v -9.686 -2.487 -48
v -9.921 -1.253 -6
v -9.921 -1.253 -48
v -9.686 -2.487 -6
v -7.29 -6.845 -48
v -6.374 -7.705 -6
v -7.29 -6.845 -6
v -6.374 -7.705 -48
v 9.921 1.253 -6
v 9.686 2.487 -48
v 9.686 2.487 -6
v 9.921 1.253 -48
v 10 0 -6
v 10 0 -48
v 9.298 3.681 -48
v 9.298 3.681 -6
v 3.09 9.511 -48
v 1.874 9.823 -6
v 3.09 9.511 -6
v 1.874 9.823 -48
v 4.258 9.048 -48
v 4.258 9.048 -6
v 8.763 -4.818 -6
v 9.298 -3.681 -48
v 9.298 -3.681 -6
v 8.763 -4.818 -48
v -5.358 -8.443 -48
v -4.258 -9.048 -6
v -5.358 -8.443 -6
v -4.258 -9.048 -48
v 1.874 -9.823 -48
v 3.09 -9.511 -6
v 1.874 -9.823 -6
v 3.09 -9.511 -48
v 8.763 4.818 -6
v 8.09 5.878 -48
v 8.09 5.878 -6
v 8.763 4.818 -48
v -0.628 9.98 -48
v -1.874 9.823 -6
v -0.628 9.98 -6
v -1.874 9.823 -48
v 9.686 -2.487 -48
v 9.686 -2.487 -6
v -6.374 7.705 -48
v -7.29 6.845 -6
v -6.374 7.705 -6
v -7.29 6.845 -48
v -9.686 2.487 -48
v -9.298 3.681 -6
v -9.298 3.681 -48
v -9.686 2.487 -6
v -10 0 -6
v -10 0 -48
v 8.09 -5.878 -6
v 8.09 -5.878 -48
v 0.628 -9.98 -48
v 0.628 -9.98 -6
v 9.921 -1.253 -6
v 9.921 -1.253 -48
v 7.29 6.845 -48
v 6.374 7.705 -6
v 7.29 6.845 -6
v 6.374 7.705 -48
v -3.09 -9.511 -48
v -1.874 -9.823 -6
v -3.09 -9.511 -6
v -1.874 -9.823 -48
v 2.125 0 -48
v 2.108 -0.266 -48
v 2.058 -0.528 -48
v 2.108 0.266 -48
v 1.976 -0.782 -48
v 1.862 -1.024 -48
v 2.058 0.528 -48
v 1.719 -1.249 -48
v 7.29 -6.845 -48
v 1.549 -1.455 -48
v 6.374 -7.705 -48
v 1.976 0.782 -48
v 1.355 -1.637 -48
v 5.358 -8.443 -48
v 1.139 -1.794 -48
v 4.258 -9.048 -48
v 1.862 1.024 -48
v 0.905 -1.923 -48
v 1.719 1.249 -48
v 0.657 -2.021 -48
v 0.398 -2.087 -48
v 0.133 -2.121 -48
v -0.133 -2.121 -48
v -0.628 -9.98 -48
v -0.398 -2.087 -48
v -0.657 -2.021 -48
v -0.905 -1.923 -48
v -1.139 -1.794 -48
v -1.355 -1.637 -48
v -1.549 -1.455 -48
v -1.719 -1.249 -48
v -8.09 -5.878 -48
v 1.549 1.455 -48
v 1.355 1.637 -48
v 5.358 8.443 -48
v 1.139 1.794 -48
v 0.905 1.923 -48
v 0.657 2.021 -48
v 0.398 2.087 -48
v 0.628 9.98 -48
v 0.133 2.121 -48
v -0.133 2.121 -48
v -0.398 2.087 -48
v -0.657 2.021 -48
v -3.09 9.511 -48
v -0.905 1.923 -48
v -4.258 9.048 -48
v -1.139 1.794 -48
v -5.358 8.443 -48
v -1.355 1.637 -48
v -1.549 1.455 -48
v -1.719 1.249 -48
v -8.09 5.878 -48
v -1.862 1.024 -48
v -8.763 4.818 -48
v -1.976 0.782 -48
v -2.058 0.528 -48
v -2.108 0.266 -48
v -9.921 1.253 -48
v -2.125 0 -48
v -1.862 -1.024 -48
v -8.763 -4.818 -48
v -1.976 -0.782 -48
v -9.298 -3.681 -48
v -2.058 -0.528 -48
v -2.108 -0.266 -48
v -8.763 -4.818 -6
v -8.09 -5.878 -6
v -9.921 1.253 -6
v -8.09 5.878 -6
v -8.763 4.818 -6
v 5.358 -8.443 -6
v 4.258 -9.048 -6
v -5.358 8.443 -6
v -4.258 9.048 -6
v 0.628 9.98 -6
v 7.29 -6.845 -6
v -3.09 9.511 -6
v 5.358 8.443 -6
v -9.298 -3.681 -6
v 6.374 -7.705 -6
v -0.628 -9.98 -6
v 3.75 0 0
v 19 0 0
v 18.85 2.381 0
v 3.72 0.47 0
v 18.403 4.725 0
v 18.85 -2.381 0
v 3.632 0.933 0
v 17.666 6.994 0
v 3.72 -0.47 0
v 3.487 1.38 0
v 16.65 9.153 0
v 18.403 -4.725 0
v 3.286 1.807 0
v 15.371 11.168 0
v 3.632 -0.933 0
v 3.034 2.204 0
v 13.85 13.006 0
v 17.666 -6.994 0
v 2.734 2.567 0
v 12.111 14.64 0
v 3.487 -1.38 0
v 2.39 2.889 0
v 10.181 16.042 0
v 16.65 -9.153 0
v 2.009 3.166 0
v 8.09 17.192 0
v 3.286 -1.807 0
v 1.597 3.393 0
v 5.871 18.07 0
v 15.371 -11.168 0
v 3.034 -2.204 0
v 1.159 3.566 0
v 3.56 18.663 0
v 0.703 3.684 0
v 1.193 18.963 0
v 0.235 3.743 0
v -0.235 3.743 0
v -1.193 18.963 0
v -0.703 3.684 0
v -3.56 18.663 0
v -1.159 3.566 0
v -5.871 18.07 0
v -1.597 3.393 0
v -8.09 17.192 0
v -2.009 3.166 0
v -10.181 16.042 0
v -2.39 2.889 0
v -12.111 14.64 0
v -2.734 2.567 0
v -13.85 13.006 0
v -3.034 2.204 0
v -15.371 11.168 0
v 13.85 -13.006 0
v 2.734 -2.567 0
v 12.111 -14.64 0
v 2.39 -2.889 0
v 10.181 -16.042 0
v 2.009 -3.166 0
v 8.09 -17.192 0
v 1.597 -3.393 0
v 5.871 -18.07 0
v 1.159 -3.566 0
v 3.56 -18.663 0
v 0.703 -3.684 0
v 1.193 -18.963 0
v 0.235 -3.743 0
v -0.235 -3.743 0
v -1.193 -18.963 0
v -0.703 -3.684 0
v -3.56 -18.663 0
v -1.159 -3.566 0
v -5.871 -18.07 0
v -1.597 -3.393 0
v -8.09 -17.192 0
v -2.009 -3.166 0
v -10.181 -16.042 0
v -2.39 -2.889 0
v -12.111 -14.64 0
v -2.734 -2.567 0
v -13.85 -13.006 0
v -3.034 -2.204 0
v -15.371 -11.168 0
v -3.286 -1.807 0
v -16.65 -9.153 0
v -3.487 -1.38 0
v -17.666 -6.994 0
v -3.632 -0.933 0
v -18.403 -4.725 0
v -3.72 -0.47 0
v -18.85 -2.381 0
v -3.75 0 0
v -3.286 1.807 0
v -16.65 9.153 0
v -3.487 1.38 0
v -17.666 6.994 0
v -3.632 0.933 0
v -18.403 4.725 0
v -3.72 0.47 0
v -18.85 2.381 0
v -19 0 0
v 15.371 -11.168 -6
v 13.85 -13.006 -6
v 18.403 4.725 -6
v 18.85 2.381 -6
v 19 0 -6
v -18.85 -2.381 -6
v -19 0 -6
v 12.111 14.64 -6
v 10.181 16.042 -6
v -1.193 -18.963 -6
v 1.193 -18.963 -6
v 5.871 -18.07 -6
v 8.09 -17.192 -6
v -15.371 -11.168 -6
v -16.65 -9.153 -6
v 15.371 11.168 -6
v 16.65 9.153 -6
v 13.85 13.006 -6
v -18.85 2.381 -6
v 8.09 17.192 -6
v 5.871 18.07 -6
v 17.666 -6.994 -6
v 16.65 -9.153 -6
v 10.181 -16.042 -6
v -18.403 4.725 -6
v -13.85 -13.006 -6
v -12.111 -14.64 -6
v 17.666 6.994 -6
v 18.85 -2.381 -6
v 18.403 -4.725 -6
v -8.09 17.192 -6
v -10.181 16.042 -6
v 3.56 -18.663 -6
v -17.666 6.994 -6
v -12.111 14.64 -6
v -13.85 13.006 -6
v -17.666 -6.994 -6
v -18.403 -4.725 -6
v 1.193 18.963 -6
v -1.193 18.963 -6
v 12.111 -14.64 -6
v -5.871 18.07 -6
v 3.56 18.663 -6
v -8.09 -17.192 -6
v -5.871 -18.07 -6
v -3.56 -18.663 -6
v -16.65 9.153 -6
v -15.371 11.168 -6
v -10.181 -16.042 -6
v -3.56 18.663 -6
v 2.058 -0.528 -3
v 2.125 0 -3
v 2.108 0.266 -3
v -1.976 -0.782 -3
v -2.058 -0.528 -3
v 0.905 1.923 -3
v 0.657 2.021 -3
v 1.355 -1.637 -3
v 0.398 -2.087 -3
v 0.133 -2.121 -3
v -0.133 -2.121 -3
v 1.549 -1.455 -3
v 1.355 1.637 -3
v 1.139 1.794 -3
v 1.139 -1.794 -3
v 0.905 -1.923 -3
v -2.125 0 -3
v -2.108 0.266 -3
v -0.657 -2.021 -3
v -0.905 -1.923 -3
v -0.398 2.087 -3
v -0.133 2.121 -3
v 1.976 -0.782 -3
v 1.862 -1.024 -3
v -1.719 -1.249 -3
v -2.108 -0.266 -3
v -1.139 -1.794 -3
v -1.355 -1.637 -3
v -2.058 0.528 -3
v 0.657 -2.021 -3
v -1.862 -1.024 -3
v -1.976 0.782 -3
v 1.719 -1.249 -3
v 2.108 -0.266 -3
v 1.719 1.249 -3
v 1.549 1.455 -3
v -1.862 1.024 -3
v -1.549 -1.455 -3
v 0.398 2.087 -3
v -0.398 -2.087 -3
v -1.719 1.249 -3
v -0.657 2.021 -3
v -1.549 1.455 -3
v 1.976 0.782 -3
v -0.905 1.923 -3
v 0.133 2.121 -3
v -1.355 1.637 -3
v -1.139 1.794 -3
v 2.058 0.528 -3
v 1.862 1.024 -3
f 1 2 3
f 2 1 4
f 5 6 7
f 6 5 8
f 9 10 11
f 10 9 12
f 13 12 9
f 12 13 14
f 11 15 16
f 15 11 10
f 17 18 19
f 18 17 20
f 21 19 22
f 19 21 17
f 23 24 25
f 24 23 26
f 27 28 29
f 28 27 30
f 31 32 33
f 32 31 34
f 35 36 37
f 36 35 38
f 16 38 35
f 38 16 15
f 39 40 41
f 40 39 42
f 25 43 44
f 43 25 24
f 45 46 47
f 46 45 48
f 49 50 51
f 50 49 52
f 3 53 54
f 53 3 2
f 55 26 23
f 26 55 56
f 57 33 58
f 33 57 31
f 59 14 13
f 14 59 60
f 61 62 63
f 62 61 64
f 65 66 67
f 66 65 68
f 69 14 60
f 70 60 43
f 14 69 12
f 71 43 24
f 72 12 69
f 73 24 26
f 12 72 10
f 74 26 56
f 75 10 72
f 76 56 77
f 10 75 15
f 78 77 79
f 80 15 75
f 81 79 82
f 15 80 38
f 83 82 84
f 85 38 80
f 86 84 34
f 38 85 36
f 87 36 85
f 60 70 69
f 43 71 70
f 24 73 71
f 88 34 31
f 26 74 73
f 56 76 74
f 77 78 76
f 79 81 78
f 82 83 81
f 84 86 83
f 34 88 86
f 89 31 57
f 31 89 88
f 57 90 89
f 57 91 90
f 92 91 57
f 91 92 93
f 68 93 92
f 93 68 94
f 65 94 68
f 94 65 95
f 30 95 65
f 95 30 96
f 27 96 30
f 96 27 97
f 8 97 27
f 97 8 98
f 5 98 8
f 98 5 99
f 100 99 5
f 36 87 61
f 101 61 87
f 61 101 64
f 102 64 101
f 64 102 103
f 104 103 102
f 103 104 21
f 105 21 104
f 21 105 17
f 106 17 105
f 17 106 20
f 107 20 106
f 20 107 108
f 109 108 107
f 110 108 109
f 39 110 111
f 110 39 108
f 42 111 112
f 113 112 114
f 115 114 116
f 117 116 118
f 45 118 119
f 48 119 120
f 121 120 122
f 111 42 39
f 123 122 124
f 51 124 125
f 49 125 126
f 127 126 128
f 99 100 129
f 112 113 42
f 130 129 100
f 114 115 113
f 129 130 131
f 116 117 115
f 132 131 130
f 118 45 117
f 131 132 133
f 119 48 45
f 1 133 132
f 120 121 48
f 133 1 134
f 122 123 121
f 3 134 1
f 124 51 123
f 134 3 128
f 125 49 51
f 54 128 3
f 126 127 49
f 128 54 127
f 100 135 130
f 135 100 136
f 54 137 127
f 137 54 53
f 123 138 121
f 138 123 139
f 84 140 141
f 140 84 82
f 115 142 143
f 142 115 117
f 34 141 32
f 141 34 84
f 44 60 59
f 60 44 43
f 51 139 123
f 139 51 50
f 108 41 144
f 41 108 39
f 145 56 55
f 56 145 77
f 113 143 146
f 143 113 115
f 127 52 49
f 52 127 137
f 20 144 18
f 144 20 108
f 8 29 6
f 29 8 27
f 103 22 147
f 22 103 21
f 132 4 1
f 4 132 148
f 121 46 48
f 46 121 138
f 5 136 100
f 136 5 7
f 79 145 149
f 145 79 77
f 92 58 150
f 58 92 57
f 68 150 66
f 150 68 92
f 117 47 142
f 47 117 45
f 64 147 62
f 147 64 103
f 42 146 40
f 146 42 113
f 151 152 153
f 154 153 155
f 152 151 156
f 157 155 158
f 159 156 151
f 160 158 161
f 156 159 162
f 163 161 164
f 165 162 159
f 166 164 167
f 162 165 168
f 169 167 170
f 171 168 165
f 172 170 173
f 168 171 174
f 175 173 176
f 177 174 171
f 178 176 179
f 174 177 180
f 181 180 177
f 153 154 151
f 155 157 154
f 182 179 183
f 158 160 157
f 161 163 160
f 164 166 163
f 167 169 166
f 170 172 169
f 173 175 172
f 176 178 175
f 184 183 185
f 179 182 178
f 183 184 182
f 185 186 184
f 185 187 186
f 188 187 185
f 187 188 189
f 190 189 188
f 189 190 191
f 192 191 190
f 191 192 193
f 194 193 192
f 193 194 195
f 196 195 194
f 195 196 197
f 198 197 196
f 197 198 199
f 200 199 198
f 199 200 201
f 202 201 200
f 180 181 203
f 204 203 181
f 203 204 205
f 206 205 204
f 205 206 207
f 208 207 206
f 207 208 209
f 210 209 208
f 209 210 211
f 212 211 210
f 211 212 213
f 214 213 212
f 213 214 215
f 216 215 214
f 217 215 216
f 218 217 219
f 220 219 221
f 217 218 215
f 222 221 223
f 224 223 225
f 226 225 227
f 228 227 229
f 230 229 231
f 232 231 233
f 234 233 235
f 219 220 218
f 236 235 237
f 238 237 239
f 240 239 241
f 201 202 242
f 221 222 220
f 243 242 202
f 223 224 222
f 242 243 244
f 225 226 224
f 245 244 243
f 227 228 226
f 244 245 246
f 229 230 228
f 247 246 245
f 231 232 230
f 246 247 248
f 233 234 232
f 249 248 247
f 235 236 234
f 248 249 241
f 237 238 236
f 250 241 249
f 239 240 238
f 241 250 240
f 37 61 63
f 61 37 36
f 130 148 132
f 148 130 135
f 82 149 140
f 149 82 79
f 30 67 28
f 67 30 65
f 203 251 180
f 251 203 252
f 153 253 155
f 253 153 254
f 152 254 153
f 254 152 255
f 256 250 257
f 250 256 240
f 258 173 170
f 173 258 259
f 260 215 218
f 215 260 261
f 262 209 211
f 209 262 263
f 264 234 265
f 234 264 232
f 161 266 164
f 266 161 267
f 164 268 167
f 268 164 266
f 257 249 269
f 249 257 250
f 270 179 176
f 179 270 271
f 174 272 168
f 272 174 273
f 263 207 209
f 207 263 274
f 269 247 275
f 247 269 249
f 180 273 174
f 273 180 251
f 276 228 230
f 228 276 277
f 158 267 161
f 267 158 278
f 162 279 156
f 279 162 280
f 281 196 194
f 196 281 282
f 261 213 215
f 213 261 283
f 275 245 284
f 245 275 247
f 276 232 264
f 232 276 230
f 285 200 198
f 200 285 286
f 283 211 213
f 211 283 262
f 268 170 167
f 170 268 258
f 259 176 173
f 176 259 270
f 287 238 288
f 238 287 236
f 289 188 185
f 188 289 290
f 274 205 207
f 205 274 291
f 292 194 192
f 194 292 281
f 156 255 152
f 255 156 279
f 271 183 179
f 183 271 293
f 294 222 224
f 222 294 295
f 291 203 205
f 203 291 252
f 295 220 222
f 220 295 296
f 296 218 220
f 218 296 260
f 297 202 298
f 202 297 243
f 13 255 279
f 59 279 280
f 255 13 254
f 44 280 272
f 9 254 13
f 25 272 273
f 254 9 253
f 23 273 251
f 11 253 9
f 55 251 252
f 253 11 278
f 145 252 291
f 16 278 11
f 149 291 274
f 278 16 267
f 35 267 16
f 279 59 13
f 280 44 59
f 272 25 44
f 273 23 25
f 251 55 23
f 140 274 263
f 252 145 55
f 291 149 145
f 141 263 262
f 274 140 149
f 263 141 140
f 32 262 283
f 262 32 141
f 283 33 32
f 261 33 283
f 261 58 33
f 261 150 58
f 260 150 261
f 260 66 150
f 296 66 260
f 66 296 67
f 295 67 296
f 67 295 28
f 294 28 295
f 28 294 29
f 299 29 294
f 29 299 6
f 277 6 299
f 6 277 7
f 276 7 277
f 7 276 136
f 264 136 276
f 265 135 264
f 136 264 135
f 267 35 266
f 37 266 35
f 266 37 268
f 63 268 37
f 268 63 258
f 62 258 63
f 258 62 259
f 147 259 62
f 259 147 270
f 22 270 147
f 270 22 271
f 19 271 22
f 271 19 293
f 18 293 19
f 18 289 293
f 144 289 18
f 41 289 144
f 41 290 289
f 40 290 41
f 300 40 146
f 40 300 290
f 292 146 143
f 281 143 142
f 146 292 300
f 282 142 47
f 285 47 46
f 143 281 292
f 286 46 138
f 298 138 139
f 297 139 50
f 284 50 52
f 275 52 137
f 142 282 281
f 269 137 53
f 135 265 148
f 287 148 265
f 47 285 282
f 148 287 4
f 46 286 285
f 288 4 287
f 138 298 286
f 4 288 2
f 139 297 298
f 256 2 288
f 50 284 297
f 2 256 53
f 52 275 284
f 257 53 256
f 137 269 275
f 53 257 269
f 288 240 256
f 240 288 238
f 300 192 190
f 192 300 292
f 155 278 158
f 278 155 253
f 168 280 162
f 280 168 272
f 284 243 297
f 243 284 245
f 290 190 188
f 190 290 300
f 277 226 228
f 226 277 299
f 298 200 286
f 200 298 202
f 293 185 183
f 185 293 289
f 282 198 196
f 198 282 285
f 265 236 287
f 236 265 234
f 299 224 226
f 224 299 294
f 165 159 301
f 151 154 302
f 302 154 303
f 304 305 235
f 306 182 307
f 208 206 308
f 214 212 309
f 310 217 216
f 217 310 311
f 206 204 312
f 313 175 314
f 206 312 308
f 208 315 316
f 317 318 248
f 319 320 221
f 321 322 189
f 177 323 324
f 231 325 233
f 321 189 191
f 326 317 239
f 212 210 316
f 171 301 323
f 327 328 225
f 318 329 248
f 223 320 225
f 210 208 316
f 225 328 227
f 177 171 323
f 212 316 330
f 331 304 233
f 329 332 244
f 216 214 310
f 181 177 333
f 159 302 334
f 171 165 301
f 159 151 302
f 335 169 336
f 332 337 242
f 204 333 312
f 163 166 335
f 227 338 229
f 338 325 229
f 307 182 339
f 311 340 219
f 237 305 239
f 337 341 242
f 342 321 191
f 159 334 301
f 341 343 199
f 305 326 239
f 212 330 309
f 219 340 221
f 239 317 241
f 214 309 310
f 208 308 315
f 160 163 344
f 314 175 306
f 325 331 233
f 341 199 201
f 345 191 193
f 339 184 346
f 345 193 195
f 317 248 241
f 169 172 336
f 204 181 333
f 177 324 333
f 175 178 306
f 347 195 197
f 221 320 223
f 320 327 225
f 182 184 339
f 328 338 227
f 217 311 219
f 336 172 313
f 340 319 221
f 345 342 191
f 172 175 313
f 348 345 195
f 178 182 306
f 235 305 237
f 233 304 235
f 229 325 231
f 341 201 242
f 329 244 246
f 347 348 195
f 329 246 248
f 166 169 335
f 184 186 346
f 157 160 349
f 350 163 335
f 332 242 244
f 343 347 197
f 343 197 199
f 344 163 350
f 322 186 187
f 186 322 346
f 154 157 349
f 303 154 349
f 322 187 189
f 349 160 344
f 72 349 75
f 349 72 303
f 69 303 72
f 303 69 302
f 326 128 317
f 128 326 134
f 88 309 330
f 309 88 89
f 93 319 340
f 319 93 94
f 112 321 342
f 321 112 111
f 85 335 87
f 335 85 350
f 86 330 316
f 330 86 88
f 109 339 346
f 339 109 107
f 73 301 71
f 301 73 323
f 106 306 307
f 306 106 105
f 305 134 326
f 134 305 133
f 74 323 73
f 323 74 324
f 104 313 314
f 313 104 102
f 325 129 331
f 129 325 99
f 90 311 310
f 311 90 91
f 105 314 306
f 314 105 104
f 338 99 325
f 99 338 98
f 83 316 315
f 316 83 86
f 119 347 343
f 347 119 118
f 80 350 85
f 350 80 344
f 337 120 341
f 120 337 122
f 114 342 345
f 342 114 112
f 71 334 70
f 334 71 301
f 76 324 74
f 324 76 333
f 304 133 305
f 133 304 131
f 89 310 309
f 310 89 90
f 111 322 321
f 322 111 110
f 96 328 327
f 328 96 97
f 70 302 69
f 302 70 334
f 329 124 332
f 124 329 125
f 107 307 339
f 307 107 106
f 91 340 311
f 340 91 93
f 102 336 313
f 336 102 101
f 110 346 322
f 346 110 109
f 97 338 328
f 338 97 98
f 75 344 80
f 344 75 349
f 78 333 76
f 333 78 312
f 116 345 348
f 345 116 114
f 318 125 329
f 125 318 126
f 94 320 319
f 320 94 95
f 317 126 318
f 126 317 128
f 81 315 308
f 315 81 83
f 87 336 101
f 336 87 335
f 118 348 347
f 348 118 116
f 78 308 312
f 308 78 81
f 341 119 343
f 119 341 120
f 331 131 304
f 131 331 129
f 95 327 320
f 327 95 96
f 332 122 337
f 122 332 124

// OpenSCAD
$fn = 50;


difference() {
	union() {
		translate(v = [0, 0, -48.0000000000]) {
			cylinder(h = 48, r = 10.0000000000);
		}
		translate(v = [0, 0, -6.0000000000]) {
			cylinder(h = 6, r = 19.0000000000);
		}
	}
	union() {
		translate(v = [0, 0, 0]) {
			rotate(a = [0, 0, 0]) {
				difference() {
					union() {
						#translate(v = [0, 0, -48.0000000000]) {
							cylinder(h = 48, r = 2.0000000000);
						}
						#translate(v = [0, 0, -3]) {
							cylinder(h = 3, r1 = 2.1250000000, r2 = 3.7500000000);
						}
						#translate(v = [0, 0, -48.0000000000]) {
							cylinder(h = 48, r = 2.1250000000);
						}
						#translate(v = [0, 0, -48.0000000000]) {
							cylinder(h = 48, r = 2.0000000000);
						}
					}
					union();
				}
			}
		}
	}
}
